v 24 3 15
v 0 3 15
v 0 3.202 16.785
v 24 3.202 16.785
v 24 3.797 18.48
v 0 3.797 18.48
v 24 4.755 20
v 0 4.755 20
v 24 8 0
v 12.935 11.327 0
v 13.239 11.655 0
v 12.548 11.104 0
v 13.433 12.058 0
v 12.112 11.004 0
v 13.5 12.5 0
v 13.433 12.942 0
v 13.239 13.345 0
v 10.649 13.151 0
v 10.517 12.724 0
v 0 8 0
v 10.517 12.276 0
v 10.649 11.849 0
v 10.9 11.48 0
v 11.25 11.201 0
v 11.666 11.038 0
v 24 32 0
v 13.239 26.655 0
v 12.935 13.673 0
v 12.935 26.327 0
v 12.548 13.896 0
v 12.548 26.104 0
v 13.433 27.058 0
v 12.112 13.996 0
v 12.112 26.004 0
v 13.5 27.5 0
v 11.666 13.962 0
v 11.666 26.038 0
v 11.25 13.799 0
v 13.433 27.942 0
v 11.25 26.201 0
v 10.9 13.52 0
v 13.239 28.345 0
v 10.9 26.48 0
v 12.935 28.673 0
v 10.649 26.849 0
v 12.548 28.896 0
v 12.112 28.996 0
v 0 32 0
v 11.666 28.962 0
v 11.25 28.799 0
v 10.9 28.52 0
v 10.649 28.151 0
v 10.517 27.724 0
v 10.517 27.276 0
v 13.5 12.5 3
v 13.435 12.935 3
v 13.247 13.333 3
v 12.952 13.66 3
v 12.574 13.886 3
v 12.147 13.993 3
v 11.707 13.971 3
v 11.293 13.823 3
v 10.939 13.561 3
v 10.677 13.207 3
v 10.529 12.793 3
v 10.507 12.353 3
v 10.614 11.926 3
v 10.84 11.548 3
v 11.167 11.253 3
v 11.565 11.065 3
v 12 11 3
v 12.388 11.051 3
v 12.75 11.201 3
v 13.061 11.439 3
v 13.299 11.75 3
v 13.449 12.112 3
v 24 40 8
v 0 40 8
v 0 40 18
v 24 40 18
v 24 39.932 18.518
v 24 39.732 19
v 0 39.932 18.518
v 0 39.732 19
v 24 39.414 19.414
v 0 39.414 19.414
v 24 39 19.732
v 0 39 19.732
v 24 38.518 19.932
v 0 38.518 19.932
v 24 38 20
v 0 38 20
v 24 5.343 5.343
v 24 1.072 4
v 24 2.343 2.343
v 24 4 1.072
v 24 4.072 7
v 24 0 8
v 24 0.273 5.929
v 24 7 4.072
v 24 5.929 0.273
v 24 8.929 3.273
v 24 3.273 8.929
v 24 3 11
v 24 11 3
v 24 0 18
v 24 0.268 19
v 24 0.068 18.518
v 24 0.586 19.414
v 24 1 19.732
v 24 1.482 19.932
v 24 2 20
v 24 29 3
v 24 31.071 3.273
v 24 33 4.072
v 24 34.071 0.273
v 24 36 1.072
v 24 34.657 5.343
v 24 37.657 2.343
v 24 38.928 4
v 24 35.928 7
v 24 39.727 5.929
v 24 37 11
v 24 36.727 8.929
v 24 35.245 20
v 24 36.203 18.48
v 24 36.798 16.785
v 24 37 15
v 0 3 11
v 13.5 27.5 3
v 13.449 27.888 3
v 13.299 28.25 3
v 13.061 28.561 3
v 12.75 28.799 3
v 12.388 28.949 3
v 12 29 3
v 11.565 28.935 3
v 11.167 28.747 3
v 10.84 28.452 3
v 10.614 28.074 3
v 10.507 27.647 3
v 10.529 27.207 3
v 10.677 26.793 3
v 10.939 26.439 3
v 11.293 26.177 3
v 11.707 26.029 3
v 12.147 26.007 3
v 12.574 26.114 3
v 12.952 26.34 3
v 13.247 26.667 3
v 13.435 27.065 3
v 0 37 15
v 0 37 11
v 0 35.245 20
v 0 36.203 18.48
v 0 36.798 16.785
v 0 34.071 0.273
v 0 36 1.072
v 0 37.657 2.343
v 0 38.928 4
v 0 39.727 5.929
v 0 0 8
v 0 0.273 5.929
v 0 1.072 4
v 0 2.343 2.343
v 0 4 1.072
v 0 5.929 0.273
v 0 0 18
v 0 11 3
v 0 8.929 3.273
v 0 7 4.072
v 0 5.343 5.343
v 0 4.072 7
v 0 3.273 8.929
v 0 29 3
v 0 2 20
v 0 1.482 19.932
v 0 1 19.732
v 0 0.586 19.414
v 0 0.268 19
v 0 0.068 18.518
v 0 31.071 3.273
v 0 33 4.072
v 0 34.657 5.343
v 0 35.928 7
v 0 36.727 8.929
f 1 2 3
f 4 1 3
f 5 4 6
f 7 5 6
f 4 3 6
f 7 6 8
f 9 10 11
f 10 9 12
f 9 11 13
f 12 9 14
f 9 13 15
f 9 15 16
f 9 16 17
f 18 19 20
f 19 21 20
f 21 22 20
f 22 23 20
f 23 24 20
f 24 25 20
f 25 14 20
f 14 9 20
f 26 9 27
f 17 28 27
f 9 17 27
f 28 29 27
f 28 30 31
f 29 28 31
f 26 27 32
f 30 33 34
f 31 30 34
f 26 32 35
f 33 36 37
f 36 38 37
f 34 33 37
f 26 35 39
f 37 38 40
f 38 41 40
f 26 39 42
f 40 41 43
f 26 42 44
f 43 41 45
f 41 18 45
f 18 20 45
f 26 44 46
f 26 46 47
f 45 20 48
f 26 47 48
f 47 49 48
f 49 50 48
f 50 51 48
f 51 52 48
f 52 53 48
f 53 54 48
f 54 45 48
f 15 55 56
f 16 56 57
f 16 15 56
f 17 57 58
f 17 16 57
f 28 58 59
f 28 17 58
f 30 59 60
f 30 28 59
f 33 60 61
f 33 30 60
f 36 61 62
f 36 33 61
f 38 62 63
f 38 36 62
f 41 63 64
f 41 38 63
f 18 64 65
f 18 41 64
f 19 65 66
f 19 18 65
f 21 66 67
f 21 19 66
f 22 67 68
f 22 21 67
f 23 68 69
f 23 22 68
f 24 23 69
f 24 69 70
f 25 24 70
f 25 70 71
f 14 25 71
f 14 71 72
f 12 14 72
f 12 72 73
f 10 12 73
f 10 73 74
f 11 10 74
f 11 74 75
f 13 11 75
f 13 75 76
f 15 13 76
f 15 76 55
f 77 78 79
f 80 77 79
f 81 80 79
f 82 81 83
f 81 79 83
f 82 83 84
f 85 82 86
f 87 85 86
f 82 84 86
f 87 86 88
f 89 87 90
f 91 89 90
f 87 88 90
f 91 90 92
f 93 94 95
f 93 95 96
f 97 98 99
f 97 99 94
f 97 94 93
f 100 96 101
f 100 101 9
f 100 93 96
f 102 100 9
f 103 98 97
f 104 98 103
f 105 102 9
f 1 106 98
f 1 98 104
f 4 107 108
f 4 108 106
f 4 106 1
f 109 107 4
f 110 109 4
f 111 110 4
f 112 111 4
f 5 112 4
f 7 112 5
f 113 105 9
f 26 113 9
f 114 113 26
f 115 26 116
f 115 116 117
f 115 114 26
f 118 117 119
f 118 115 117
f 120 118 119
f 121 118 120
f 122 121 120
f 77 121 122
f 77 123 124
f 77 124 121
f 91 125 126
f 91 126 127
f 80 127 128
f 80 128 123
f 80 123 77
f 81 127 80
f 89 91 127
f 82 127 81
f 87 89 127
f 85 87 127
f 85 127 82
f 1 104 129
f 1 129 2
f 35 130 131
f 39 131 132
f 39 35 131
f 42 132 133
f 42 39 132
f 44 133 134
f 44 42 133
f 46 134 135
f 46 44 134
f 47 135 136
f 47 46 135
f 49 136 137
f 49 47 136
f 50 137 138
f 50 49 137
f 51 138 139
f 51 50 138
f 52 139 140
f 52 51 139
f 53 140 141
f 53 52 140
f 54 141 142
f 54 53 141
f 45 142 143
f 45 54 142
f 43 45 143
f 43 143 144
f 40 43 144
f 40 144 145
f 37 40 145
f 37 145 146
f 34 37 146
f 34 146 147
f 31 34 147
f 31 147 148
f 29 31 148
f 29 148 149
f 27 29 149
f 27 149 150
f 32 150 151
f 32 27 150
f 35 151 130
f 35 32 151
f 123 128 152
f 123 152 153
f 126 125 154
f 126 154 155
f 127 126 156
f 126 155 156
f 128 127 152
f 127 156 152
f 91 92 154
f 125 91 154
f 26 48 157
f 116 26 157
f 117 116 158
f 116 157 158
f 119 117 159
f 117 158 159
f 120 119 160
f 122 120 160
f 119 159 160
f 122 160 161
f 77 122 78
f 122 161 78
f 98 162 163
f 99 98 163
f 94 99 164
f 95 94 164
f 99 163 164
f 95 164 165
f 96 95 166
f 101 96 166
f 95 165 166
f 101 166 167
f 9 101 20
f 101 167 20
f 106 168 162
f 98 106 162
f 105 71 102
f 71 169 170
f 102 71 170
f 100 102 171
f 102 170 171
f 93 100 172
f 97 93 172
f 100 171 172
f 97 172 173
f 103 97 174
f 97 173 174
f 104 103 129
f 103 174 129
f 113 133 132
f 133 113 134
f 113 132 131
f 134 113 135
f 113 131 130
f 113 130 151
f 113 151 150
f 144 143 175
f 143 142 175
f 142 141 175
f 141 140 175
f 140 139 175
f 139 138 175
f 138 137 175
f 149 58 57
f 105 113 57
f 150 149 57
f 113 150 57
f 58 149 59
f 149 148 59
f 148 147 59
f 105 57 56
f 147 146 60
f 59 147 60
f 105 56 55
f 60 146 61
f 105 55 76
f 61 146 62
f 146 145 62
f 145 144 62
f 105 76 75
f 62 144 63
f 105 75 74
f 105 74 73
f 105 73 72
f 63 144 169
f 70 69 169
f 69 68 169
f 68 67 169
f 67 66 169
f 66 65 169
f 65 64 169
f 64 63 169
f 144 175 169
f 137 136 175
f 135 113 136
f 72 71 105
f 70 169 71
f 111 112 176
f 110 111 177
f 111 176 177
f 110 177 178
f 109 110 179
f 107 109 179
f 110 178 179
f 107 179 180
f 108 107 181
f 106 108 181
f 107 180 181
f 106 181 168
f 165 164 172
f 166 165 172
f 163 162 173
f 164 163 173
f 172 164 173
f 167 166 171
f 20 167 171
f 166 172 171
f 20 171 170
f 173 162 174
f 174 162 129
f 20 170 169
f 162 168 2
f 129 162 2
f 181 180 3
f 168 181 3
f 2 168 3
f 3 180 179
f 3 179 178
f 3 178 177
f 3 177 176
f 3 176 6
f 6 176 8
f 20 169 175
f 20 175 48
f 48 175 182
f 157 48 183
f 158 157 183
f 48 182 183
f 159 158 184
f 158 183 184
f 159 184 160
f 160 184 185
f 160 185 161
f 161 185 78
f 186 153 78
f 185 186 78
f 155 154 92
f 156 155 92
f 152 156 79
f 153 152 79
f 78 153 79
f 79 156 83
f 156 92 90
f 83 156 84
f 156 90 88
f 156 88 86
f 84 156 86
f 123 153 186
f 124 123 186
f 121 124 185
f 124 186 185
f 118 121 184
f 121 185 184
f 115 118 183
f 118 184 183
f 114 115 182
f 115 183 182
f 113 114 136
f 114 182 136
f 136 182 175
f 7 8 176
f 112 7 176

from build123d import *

# Parameters (mm, degrees)
F1_DEPTH = 24
F2_R     = 1.5
F3_DEPTH = 5


with BuildPart() as f1:
    # F0 (on Right) → F1 (new body)
    with BuildSketch(Plane.YZ):
        with BuildLine():
            ThreePointArc((0, 8), (2.343146, 2.343146), (8, 0))
            Line((8, 0), (32, 0))
            ThreePointArc((32, 0), (37.656854, 2.343146), (40, 8))
            Line((40, 8), (40, 18))
            ThreePointArc((40, 18), (39.414214, 19.414214), (38, 20))
            Line((38, 20), (35.244998, 20))
            ThreePointArc((35.244998, 20), (36.548509, 17.64953), (37, 15))
            Line((37, 15), (37, 11))
            ThreePointArc((37, 11), (34.656854, 5.343146), (29, 3))
            Line((29, 3), (11, 3))
            ThreePointArc((11, 3), (5.343146, 5.343146), (3, 11))
            Line((3, 11), (3, 15))
            ThreePointArc((3, 15), (3.451491, 17.64953), (4.755002, 20))
            Line((4.755002, 20), (2, 20))
            ThreePointArc((2, 20), (0.585786, 19.414214), (0, 18))
            Line((0, 18), (0, 8))
        make_face()
    extrude(amount=F1_DEPTH)

    # F2 (on Top) → F3 (cut)
    with BuildSketch(Plane.XY):
        with Locations((12, 12.5)):
            Circle(F2_R)
        with Locations((12, 27.5)):
            Circle(F2_R)
    extrude(amount=F3_DEPTH, mode=Mode.SUBTRACT)


solid = f1.part
